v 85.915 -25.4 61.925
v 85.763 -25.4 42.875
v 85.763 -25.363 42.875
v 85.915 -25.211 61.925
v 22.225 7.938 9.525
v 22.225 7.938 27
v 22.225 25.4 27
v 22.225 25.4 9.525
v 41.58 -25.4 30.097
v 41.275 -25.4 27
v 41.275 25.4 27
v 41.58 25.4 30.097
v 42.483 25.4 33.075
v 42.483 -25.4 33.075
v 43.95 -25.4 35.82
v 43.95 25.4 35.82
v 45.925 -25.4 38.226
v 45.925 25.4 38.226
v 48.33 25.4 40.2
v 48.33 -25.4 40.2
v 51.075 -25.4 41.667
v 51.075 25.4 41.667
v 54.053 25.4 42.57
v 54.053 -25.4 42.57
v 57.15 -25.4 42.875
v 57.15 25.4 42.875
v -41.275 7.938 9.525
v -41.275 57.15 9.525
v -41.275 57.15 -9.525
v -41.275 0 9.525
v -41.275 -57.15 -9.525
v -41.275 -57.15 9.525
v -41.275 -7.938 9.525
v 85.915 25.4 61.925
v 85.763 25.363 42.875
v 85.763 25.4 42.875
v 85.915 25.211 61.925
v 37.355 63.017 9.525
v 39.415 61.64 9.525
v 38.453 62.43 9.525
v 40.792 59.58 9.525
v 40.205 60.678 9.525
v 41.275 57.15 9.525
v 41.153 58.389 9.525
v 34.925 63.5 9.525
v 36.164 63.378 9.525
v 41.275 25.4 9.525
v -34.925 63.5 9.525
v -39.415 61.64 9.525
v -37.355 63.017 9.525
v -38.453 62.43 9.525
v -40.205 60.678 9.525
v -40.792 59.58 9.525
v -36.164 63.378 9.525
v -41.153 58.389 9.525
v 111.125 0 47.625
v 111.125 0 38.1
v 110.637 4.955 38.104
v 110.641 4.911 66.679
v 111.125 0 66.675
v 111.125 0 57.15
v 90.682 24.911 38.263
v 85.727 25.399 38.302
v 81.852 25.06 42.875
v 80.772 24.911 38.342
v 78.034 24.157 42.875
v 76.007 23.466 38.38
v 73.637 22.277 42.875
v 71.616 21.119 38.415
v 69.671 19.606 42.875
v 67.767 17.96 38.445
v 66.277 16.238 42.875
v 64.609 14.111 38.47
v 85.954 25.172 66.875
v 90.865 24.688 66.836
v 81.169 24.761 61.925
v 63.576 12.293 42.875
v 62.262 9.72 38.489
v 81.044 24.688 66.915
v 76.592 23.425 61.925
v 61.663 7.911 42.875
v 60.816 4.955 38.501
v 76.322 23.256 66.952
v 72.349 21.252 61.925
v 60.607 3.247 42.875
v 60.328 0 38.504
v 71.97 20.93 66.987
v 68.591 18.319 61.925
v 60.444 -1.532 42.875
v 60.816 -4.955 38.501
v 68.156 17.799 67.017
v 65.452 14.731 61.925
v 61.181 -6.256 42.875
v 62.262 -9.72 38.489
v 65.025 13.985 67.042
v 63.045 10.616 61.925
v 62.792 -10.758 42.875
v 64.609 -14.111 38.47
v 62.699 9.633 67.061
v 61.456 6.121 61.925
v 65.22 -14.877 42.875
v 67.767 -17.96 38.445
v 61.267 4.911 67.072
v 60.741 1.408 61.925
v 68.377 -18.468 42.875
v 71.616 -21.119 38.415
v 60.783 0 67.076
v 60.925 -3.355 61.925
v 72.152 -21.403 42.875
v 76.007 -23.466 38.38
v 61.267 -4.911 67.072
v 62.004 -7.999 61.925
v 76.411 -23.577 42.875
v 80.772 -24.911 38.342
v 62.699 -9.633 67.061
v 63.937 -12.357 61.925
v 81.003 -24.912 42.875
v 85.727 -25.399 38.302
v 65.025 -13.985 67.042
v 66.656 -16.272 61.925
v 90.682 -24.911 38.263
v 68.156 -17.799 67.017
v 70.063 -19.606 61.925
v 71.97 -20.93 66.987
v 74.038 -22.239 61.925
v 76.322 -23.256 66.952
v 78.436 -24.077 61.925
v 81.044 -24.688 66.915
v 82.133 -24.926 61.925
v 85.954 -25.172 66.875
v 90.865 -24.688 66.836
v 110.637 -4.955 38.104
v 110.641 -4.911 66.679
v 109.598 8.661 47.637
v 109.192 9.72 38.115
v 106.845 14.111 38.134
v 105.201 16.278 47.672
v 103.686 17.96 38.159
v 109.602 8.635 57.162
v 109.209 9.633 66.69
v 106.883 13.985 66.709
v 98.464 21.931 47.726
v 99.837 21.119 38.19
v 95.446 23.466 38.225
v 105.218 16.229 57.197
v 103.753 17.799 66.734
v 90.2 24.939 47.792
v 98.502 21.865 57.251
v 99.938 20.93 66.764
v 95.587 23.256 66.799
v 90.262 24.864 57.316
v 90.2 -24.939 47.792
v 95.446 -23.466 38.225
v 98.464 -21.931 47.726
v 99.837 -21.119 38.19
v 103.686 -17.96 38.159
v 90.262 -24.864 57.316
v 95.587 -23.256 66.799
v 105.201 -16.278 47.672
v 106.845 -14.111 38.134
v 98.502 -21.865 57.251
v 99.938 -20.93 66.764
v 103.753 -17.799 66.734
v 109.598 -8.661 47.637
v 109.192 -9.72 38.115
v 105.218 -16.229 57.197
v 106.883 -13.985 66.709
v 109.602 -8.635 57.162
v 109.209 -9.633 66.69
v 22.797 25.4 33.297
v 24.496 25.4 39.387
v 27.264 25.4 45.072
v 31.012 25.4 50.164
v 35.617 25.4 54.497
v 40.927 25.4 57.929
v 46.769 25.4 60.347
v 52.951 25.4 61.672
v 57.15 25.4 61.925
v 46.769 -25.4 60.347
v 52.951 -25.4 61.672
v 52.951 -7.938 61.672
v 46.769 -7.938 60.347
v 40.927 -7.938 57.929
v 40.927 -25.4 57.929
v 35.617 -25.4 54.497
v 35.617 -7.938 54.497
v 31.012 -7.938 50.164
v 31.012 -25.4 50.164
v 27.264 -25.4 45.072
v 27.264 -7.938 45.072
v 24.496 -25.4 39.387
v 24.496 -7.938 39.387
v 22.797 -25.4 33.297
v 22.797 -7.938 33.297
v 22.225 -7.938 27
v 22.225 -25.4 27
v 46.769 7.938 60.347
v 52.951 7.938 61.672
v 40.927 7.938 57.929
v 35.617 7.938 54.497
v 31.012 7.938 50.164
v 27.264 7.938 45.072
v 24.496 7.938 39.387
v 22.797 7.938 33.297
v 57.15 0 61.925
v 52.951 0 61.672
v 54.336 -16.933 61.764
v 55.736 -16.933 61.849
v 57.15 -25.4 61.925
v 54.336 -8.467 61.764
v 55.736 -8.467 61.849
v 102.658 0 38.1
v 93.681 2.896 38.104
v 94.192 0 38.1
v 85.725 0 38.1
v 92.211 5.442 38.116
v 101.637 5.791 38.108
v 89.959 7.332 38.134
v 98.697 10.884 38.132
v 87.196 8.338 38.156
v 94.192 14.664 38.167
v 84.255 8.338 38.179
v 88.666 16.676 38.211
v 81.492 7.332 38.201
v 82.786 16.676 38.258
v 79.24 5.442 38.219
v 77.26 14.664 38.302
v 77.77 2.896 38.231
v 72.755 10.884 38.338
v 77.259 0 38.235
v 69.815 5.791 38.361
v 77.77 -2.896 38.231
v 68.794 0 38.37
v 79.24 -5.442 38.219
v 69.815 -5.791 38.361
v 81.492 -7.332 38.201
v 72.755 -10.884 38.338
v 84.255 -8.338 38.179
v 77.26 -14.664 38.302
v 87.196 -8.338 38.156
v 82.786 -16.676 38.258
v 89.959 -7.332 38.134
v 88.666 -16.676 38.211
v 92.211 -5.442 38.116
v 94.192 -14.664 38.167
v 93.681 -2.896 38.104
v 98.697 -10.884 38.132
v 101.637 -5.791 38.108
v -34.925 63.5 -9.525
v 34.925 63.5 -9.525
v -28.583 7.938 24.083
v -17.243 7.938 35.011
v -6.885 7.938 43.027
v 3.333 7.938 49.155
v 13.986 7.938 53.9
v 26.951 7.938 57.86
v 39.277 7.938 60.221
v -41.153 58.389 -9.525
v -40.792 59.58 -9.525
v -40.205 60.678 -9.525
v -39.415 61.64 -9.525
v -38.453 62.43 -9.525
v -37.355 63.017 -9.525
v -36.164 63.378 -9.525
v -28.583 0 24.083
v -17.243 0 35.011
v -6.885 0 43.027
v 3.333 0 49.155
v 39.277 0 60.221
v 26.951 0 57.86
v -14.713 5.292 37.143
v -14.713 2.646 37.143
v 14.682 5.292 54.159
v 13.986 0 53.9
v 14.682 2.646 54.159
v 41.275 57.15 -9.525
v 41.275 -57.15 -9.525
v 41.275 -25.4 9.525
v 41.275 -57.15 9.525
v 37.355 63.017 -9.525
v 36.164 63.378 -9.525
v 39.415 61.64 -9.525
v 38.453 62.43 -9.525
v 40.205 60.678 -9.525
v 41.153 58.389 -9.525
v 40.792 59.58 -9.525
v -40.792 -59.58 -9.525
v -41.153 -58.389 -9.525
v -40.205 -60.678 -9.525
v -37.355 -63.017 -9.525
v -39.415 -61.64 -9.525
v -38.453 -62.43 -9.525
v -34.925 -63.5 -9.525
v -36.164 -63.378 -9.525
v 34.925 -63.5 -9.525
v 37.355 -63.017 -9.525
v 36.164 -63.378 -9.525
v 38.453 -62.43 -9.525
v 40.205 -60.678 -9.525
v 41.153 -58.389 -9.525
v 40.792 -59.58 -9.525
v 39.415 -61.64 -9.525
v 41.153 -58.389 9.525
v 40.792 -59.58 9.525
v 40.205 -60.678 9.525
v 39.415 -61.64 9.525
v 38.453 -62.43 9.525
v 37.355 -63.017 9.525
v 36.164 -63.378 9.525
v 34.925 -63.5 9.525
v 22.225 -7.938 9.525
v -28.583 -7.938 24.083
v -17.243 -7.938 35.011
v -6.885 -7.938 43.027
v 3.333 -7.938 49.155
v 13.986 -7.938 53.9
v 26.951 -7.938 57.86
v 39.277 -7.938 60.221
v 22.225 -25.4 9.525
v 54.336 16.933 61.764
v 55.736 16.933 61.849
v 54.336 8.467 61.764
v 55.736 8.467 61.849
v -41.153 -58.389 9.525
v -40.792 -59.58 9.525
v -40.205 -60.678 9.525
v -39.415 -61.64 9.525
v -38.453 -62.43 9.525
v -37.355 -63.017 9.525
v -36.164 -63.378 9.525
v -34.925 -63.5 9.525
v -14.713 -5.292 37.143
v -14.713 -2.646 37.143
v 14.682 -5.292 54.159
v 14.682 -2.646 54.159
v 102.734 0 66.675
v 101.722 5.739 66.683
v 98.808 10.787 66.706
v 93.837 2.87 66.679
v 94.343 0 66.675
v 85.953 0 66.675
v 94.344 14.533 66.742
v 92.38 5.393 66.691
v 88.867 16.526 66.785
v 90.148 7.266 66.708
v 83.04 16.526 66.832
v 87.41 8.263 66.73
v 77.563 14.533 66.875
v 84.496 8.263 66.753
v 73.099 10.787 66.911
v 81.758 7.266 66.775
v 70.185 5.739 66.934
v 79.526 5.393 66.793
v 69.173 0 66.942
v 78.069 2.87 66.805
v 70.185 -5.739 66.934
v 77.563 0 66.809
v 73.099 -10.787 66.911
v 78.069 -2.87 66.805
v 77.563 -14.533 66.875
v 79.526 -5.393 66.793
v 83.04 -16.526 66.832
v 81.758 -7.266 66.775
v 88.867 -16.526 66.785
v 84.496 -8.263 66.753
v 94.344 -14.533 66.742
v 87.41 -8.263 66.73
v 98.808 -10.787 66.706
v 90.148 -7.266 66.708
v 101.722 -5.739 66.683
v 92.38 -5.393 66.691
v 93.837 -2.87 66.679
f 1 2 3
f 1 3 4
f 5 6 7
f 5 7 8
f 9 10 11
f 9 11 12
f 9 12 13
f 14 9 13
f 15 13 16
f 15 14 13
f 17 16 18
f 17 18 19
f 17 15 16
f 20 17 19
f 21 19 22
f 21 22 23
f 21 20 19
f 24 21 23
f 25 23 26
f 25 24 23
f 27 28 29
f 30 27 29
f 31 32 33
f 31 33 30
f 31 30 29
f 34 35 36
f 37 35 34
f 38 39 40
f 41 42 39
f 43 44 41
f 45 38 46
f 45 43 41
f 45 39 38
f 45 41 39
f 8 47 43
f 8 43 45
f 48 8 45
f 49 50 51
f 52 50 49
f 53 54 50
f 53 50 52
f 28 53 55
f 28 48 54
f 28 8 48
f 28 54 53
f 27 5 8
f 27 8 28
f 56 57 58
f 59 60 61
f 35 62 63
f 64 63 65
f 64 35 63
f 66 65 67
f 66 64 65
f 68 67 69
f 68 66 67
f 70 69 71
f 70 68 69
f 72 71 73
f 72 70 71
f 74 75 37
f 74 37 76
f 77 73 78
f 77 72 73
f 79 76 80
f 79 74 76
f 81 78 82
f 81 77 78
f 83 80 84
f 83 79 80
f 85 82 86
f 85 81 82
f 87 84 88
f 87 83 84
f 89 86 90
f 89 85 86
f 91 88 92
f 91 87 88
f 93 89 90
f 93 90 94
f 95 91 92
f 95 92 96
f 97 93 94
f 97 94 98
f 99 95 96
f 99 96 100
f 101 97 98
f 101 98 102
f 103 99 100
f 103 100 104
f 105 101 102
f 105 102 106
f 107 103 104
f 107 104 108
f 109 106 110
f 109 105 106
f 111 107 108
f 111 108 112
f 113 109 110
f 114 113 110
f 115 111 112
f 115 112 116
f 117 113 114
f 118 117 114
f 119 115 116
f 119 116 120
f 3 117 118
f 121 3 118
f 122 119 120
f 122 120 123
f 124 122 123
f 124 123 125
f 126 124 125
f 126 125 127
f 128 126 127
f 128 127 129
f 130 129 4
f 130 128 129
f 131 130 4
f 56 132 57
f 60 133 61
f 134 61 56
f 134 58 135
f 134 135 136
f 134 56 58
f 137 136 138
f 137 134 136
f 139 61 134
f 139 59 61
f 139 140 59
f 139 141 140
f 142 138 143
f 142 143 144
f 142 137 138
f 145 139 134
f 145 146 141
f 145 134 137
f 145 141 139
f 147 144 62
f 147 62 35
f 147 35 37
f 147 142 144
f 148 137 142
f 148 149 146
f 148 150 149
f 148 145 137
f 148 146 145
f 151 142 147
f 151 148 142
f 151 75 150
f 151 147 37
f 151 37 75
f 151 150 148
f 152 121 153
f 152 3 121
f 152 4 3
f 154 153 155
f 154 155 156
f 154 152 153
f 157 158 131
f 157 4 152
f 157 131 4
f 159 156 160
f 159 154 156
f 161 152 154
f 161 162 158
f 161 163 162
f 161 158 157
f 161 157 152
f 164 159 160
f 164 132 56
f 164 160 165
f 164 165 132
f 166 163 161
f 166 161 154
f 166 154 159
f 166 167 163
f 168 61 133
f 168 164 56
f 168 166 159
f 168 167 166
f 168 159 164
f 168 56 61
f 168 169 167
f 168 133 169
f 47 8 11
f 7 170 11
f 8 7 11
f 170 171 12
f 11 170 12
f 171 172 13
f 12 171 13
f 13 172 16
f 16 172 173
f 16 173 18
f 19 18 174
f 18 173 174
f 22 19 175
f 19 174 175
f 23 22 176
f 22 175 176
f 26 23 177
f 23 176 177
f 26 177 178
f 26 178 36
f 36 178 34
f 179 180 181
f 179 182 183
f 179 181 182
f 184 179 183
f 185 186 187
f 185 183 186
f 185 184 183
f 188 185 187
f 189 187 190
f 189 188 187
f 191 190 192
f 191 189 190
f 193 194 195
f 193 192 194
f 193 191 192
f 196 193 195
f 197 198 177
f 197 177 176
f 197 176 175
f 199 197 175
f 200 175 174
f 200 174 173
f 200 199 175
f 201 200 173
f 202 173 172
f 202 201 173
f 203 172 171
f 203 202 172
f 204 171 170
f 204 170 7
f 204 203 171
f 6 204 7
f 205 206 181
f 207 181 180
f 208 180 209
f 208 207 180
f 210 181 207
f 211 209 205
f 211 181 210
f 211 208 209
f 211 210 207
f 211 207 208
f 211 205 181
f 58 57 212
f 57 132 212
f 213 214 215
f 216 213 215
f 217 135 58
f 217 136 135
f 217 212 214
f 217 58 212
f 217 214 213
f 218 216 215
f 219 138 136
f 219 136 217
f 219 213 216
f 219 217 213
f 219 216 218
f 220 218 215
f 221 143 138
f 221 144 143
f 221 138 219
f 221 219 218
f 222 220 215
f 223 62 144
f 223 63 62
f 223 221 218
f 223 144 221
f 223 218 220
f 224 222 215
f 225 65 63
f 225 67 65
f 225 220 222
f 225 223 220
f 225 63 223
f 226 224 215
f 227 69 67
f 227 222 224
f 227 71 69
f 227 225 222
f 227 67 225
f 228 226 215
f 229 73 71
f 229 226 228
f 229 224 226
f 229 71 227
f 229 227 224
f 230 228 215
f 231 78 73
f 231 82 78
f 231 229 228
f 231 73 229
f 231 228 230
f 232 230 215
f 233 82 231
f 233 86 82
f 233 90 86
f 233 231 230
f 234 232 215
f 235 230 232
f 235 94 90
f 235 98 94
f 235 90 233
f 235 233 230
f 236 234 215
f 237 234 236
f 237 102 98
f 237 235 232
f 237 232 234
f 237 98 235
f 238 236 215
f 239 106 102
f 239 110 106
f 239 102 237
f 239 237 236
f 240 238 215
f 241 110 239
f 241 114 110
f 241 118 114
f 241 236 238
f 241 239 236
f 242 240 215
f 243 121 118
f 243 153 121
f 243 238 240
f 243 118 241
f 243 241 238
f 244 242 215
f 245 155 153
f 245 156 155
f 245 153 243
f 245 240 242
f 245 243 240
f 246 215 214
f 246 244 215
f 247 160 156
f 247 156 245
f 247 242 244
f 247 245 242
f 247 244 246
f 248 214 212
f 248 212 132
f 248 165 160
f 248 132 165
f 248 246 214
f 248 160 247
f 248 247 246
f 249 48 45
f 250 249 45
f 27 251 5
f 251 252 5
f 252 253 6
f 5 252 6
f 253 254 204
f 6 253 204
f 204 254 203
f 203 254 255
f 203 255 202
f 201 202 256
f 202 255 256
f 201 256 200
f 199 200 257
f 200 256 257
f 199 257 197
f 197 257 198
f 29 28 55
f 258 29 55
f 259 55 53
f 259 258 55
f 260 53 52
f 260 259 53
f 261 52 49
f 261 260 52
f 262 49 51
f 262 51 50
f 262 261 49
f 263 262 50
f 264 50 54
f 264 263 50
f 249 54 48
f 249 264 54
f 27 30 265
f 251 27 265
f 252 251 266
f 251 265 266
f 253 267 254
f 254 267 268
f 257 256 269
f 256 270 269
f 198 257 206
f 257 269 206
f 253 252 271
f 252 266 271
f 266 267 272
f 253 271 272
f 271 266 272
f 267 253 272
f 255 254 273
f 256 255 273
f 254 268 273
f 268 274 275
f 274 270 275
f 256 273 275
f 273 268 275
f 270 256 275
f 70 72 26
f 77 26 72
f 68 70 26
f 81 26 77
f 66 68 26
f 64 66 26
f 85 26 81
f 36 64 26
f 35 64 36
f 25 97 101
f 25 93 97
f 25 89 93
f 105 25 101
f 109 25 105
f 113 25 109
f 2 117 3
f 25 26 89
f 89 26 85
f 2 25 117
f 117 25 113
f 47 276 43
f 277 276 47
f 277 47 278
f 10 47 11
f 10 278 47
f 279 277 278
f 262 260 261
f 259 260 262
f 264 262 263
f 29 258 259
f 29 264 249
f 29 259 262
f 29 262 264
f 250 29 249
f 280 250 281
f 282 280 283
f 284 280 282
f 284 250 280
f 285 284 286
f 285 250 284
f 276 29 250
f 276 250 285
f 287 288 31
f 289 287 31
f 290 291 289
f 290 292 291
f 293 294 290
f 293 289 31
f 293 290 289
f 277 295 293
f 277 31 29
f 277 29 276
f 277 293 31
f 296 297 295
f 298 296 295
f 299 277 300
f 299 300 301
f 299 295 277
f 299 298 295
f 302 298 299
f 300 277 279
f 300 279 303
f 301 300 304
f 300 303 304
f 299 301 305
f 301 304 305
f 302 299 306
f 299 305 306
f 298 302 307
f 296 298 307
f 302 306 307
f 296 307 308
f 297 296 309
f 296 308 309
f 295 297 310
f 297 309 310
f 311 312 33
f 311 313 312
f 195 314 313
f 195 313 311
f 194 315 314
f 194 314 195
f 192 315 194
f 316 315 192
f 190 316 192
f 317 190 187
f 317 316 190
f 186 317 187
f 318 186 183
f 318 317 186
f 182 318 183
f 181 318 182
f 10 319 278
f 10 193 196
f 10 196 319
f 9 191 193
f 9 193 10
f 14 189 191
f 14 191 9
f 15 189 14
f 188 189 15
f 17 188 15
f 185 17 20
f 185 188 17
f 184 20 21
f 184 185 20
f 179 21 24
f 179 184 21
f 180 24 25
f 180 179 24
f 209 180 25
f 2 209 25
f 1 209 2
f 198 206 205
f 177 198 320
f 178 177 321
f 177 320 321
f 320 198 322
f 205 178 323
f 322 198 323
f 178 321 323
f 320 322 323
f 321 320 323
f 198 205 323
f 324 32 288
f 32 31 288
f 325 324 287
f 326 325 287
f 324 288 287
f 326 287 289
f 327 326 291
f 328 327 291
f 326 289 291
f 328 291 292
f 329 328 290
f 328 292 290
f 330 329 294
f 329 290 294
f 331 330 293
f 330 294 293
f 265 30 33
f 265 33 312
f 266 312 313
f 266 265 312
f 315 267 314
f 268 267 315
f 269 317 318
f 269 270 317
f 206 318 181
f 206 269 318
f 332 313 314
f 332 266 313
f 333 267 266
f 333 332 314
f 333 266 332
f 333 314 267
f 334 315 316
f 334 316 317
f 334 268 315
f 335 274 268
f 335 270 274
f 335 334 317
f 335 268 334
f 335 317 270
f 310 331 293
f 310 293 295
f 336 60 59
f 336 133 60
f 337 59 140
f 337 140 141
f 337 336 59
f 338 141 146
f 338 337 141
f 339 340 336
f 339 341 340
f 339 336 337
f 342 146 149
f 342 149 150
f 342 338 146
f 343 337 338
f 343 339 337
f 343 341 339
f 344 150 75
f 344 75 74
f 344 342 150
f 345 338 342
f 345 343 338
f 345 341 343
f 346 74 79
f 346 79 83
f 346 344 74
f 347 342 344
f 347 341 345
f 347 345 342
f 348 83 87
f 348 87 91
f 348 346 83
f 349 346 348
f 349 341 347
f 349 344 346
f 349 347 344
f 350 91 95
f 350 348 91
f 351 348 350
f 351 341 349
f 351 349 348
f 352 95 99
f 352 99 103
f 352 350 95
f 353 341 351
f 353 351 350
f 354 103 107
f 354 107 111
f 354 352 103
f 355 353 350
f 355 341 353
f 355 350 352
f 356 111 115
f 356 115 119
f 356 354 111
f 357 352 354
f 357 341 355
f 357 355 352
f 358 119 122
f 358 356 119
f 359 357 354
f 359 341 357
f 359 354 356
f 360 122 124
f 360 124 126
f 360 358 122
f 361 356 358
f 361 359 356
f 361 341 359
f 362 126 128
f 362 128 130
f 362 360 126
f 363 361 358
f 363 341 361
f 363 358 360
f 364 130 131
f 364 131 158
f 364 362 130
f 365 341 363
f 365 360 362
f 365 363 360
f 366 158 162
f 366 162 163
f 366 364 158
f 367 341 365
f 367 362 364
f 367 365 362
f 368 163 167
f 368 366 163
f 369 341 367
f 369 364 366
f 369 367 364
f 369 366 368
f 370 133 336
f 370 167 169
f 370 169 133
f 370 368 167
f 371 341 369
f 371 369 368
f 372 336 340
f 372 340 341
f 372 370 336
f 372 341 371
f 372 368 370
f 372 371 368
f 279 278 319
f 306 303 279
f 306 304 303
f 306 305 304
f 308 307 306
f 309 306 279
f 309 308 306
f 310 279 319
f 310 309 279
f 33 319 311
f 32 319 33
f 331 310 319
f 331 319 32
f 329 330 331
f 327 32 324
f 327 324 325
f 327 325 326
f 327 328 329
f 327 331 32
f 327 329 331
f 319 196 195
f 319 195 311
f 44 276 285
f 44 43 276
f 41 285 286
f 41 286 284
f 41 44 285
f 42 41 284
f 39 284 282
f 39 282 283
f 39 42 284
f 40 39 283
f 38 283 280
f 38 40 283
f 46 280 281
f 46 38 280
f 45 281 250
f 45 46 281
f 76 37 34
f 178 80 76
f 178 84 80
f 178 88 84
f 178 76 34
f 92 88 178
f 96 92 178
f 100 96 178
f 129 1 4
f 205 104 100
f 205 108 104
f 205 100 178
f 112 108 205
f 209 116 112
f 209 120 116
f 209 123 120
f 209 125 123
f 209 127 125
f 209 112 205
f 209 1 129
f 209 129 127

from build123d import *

# Parameters (mm, degrees)
F1_DEPTH = 63.5
F2_DEPTH = 25.4
F3_DEPTH = 7.9375
F5_R     = 6.35


with BuildPart() as f1:
    # F0 (on Front) → F1 (new body, symmetric)
    with BuildSketch(Plane.XZ):
        Polygon((41.275, -9.525), (41.275, 9.525), (22.225, 9.525), (-41.275, 9.525), (-41.275, -9.525), align=None)
    extrude(amount=F1_DEPTH, both=True)

    # F0 (on Front) → F2 (join, symmetric)
    with BuildSketch(Plane.XZ):
        with BuildLine():
            Line((22.225, 9.525), (41.275, 9.525))
            Line((41.275, 9.525), (41.275, 27.0002))
            ThreePointArc((41.275, 27.0002), (45.9246798487, 38.2255201513), (57.15, 42.8752))
            Line((57.15, 42.8752), (60.325, 42.8752))
            Line((60.325, 42.8752), (60.325, 61.9252))
            Line((60.325, 61.9252), (57.15, 61.9252))
            add(Edge.make_bspline(
                [(52.9513252364, 61.6718996299), (54.3293732693, 61.7682561346), (55.728666372, 61.8526413819), (57.15, 61.9252)],
                knots=[108.1713058896, 108.1713058896, 108.1713058896, 108.1713058896, 111.5045361635, 111.5045361635, 111.5045361635, 111.5045361635], degree=3))
            ThreePointArc((52.9513252364, 61.6718996299), (31.0119593206, 50.1639314446), (22.225, 27.0002))
            Line((22.225, 27.0002), (22.225, 9.525))
        make_face()
        Polygon((60.325, 61.9252), (60.325, 42.8752), (85.7630187815, 42.8752), (85.9146894524, 61.9252), align=None)
    extrude(amount=F2_DEPTH, both=True)

    # F0 (on Front) → F3 (join, symmetric)
    with BuildSketch(Plane.XZ):
        with BuildLine():
            Line((-41.275, 9.525), (22.225, 9.525))
            Line((22.225, 9.525), (22.225, 27.0002))
            ThreePointArc((22.225, 27.0002), (31.0119593206, 50.1639314446), (52.9513252364, 61.6718996299))
            add(Edge.make_bspline(
                [(-41.275, 9.525), (-14.1161793471, 42.8102760559), (8.2303659697, 58.5449002676), (52.9513252364, 61.6718996299)],
                knots=[0, 0, 0, 0, 108.1713058896, 108.1713058896, 108.1713058896, 108.1713058896], degree=3))
        make_face()
    extrude(amount=F3_DEPTH, both=True)

    # F0 (on Front) → F4 (revolve)
    with BuildSketch(Plane.XZ):
        Polygon((85.9146894524, 61.9252), (85.7630187815, 42.8752), (85.725, 38.1), (111.125, 38.1), (111.125, 66.675), (85.9525060063, 66.675), align=None)
    revolve(axis=Axis((85.8387530032, 0, 52.3875), (0.0079614627, 0, 0.9999683071)))

    # F5
    f5_edges = [f1.edges().sort_by_distance(p)[0] for p in [
        (41.275, 63.5, 0),
        (-41.275, 63.5, 0),
        (-41.275, -63.5, 0),
        (41.275, -63.5, 0),
    ]]
    fillet(f5_edges, radius=F5_R)


solid = f1.part
